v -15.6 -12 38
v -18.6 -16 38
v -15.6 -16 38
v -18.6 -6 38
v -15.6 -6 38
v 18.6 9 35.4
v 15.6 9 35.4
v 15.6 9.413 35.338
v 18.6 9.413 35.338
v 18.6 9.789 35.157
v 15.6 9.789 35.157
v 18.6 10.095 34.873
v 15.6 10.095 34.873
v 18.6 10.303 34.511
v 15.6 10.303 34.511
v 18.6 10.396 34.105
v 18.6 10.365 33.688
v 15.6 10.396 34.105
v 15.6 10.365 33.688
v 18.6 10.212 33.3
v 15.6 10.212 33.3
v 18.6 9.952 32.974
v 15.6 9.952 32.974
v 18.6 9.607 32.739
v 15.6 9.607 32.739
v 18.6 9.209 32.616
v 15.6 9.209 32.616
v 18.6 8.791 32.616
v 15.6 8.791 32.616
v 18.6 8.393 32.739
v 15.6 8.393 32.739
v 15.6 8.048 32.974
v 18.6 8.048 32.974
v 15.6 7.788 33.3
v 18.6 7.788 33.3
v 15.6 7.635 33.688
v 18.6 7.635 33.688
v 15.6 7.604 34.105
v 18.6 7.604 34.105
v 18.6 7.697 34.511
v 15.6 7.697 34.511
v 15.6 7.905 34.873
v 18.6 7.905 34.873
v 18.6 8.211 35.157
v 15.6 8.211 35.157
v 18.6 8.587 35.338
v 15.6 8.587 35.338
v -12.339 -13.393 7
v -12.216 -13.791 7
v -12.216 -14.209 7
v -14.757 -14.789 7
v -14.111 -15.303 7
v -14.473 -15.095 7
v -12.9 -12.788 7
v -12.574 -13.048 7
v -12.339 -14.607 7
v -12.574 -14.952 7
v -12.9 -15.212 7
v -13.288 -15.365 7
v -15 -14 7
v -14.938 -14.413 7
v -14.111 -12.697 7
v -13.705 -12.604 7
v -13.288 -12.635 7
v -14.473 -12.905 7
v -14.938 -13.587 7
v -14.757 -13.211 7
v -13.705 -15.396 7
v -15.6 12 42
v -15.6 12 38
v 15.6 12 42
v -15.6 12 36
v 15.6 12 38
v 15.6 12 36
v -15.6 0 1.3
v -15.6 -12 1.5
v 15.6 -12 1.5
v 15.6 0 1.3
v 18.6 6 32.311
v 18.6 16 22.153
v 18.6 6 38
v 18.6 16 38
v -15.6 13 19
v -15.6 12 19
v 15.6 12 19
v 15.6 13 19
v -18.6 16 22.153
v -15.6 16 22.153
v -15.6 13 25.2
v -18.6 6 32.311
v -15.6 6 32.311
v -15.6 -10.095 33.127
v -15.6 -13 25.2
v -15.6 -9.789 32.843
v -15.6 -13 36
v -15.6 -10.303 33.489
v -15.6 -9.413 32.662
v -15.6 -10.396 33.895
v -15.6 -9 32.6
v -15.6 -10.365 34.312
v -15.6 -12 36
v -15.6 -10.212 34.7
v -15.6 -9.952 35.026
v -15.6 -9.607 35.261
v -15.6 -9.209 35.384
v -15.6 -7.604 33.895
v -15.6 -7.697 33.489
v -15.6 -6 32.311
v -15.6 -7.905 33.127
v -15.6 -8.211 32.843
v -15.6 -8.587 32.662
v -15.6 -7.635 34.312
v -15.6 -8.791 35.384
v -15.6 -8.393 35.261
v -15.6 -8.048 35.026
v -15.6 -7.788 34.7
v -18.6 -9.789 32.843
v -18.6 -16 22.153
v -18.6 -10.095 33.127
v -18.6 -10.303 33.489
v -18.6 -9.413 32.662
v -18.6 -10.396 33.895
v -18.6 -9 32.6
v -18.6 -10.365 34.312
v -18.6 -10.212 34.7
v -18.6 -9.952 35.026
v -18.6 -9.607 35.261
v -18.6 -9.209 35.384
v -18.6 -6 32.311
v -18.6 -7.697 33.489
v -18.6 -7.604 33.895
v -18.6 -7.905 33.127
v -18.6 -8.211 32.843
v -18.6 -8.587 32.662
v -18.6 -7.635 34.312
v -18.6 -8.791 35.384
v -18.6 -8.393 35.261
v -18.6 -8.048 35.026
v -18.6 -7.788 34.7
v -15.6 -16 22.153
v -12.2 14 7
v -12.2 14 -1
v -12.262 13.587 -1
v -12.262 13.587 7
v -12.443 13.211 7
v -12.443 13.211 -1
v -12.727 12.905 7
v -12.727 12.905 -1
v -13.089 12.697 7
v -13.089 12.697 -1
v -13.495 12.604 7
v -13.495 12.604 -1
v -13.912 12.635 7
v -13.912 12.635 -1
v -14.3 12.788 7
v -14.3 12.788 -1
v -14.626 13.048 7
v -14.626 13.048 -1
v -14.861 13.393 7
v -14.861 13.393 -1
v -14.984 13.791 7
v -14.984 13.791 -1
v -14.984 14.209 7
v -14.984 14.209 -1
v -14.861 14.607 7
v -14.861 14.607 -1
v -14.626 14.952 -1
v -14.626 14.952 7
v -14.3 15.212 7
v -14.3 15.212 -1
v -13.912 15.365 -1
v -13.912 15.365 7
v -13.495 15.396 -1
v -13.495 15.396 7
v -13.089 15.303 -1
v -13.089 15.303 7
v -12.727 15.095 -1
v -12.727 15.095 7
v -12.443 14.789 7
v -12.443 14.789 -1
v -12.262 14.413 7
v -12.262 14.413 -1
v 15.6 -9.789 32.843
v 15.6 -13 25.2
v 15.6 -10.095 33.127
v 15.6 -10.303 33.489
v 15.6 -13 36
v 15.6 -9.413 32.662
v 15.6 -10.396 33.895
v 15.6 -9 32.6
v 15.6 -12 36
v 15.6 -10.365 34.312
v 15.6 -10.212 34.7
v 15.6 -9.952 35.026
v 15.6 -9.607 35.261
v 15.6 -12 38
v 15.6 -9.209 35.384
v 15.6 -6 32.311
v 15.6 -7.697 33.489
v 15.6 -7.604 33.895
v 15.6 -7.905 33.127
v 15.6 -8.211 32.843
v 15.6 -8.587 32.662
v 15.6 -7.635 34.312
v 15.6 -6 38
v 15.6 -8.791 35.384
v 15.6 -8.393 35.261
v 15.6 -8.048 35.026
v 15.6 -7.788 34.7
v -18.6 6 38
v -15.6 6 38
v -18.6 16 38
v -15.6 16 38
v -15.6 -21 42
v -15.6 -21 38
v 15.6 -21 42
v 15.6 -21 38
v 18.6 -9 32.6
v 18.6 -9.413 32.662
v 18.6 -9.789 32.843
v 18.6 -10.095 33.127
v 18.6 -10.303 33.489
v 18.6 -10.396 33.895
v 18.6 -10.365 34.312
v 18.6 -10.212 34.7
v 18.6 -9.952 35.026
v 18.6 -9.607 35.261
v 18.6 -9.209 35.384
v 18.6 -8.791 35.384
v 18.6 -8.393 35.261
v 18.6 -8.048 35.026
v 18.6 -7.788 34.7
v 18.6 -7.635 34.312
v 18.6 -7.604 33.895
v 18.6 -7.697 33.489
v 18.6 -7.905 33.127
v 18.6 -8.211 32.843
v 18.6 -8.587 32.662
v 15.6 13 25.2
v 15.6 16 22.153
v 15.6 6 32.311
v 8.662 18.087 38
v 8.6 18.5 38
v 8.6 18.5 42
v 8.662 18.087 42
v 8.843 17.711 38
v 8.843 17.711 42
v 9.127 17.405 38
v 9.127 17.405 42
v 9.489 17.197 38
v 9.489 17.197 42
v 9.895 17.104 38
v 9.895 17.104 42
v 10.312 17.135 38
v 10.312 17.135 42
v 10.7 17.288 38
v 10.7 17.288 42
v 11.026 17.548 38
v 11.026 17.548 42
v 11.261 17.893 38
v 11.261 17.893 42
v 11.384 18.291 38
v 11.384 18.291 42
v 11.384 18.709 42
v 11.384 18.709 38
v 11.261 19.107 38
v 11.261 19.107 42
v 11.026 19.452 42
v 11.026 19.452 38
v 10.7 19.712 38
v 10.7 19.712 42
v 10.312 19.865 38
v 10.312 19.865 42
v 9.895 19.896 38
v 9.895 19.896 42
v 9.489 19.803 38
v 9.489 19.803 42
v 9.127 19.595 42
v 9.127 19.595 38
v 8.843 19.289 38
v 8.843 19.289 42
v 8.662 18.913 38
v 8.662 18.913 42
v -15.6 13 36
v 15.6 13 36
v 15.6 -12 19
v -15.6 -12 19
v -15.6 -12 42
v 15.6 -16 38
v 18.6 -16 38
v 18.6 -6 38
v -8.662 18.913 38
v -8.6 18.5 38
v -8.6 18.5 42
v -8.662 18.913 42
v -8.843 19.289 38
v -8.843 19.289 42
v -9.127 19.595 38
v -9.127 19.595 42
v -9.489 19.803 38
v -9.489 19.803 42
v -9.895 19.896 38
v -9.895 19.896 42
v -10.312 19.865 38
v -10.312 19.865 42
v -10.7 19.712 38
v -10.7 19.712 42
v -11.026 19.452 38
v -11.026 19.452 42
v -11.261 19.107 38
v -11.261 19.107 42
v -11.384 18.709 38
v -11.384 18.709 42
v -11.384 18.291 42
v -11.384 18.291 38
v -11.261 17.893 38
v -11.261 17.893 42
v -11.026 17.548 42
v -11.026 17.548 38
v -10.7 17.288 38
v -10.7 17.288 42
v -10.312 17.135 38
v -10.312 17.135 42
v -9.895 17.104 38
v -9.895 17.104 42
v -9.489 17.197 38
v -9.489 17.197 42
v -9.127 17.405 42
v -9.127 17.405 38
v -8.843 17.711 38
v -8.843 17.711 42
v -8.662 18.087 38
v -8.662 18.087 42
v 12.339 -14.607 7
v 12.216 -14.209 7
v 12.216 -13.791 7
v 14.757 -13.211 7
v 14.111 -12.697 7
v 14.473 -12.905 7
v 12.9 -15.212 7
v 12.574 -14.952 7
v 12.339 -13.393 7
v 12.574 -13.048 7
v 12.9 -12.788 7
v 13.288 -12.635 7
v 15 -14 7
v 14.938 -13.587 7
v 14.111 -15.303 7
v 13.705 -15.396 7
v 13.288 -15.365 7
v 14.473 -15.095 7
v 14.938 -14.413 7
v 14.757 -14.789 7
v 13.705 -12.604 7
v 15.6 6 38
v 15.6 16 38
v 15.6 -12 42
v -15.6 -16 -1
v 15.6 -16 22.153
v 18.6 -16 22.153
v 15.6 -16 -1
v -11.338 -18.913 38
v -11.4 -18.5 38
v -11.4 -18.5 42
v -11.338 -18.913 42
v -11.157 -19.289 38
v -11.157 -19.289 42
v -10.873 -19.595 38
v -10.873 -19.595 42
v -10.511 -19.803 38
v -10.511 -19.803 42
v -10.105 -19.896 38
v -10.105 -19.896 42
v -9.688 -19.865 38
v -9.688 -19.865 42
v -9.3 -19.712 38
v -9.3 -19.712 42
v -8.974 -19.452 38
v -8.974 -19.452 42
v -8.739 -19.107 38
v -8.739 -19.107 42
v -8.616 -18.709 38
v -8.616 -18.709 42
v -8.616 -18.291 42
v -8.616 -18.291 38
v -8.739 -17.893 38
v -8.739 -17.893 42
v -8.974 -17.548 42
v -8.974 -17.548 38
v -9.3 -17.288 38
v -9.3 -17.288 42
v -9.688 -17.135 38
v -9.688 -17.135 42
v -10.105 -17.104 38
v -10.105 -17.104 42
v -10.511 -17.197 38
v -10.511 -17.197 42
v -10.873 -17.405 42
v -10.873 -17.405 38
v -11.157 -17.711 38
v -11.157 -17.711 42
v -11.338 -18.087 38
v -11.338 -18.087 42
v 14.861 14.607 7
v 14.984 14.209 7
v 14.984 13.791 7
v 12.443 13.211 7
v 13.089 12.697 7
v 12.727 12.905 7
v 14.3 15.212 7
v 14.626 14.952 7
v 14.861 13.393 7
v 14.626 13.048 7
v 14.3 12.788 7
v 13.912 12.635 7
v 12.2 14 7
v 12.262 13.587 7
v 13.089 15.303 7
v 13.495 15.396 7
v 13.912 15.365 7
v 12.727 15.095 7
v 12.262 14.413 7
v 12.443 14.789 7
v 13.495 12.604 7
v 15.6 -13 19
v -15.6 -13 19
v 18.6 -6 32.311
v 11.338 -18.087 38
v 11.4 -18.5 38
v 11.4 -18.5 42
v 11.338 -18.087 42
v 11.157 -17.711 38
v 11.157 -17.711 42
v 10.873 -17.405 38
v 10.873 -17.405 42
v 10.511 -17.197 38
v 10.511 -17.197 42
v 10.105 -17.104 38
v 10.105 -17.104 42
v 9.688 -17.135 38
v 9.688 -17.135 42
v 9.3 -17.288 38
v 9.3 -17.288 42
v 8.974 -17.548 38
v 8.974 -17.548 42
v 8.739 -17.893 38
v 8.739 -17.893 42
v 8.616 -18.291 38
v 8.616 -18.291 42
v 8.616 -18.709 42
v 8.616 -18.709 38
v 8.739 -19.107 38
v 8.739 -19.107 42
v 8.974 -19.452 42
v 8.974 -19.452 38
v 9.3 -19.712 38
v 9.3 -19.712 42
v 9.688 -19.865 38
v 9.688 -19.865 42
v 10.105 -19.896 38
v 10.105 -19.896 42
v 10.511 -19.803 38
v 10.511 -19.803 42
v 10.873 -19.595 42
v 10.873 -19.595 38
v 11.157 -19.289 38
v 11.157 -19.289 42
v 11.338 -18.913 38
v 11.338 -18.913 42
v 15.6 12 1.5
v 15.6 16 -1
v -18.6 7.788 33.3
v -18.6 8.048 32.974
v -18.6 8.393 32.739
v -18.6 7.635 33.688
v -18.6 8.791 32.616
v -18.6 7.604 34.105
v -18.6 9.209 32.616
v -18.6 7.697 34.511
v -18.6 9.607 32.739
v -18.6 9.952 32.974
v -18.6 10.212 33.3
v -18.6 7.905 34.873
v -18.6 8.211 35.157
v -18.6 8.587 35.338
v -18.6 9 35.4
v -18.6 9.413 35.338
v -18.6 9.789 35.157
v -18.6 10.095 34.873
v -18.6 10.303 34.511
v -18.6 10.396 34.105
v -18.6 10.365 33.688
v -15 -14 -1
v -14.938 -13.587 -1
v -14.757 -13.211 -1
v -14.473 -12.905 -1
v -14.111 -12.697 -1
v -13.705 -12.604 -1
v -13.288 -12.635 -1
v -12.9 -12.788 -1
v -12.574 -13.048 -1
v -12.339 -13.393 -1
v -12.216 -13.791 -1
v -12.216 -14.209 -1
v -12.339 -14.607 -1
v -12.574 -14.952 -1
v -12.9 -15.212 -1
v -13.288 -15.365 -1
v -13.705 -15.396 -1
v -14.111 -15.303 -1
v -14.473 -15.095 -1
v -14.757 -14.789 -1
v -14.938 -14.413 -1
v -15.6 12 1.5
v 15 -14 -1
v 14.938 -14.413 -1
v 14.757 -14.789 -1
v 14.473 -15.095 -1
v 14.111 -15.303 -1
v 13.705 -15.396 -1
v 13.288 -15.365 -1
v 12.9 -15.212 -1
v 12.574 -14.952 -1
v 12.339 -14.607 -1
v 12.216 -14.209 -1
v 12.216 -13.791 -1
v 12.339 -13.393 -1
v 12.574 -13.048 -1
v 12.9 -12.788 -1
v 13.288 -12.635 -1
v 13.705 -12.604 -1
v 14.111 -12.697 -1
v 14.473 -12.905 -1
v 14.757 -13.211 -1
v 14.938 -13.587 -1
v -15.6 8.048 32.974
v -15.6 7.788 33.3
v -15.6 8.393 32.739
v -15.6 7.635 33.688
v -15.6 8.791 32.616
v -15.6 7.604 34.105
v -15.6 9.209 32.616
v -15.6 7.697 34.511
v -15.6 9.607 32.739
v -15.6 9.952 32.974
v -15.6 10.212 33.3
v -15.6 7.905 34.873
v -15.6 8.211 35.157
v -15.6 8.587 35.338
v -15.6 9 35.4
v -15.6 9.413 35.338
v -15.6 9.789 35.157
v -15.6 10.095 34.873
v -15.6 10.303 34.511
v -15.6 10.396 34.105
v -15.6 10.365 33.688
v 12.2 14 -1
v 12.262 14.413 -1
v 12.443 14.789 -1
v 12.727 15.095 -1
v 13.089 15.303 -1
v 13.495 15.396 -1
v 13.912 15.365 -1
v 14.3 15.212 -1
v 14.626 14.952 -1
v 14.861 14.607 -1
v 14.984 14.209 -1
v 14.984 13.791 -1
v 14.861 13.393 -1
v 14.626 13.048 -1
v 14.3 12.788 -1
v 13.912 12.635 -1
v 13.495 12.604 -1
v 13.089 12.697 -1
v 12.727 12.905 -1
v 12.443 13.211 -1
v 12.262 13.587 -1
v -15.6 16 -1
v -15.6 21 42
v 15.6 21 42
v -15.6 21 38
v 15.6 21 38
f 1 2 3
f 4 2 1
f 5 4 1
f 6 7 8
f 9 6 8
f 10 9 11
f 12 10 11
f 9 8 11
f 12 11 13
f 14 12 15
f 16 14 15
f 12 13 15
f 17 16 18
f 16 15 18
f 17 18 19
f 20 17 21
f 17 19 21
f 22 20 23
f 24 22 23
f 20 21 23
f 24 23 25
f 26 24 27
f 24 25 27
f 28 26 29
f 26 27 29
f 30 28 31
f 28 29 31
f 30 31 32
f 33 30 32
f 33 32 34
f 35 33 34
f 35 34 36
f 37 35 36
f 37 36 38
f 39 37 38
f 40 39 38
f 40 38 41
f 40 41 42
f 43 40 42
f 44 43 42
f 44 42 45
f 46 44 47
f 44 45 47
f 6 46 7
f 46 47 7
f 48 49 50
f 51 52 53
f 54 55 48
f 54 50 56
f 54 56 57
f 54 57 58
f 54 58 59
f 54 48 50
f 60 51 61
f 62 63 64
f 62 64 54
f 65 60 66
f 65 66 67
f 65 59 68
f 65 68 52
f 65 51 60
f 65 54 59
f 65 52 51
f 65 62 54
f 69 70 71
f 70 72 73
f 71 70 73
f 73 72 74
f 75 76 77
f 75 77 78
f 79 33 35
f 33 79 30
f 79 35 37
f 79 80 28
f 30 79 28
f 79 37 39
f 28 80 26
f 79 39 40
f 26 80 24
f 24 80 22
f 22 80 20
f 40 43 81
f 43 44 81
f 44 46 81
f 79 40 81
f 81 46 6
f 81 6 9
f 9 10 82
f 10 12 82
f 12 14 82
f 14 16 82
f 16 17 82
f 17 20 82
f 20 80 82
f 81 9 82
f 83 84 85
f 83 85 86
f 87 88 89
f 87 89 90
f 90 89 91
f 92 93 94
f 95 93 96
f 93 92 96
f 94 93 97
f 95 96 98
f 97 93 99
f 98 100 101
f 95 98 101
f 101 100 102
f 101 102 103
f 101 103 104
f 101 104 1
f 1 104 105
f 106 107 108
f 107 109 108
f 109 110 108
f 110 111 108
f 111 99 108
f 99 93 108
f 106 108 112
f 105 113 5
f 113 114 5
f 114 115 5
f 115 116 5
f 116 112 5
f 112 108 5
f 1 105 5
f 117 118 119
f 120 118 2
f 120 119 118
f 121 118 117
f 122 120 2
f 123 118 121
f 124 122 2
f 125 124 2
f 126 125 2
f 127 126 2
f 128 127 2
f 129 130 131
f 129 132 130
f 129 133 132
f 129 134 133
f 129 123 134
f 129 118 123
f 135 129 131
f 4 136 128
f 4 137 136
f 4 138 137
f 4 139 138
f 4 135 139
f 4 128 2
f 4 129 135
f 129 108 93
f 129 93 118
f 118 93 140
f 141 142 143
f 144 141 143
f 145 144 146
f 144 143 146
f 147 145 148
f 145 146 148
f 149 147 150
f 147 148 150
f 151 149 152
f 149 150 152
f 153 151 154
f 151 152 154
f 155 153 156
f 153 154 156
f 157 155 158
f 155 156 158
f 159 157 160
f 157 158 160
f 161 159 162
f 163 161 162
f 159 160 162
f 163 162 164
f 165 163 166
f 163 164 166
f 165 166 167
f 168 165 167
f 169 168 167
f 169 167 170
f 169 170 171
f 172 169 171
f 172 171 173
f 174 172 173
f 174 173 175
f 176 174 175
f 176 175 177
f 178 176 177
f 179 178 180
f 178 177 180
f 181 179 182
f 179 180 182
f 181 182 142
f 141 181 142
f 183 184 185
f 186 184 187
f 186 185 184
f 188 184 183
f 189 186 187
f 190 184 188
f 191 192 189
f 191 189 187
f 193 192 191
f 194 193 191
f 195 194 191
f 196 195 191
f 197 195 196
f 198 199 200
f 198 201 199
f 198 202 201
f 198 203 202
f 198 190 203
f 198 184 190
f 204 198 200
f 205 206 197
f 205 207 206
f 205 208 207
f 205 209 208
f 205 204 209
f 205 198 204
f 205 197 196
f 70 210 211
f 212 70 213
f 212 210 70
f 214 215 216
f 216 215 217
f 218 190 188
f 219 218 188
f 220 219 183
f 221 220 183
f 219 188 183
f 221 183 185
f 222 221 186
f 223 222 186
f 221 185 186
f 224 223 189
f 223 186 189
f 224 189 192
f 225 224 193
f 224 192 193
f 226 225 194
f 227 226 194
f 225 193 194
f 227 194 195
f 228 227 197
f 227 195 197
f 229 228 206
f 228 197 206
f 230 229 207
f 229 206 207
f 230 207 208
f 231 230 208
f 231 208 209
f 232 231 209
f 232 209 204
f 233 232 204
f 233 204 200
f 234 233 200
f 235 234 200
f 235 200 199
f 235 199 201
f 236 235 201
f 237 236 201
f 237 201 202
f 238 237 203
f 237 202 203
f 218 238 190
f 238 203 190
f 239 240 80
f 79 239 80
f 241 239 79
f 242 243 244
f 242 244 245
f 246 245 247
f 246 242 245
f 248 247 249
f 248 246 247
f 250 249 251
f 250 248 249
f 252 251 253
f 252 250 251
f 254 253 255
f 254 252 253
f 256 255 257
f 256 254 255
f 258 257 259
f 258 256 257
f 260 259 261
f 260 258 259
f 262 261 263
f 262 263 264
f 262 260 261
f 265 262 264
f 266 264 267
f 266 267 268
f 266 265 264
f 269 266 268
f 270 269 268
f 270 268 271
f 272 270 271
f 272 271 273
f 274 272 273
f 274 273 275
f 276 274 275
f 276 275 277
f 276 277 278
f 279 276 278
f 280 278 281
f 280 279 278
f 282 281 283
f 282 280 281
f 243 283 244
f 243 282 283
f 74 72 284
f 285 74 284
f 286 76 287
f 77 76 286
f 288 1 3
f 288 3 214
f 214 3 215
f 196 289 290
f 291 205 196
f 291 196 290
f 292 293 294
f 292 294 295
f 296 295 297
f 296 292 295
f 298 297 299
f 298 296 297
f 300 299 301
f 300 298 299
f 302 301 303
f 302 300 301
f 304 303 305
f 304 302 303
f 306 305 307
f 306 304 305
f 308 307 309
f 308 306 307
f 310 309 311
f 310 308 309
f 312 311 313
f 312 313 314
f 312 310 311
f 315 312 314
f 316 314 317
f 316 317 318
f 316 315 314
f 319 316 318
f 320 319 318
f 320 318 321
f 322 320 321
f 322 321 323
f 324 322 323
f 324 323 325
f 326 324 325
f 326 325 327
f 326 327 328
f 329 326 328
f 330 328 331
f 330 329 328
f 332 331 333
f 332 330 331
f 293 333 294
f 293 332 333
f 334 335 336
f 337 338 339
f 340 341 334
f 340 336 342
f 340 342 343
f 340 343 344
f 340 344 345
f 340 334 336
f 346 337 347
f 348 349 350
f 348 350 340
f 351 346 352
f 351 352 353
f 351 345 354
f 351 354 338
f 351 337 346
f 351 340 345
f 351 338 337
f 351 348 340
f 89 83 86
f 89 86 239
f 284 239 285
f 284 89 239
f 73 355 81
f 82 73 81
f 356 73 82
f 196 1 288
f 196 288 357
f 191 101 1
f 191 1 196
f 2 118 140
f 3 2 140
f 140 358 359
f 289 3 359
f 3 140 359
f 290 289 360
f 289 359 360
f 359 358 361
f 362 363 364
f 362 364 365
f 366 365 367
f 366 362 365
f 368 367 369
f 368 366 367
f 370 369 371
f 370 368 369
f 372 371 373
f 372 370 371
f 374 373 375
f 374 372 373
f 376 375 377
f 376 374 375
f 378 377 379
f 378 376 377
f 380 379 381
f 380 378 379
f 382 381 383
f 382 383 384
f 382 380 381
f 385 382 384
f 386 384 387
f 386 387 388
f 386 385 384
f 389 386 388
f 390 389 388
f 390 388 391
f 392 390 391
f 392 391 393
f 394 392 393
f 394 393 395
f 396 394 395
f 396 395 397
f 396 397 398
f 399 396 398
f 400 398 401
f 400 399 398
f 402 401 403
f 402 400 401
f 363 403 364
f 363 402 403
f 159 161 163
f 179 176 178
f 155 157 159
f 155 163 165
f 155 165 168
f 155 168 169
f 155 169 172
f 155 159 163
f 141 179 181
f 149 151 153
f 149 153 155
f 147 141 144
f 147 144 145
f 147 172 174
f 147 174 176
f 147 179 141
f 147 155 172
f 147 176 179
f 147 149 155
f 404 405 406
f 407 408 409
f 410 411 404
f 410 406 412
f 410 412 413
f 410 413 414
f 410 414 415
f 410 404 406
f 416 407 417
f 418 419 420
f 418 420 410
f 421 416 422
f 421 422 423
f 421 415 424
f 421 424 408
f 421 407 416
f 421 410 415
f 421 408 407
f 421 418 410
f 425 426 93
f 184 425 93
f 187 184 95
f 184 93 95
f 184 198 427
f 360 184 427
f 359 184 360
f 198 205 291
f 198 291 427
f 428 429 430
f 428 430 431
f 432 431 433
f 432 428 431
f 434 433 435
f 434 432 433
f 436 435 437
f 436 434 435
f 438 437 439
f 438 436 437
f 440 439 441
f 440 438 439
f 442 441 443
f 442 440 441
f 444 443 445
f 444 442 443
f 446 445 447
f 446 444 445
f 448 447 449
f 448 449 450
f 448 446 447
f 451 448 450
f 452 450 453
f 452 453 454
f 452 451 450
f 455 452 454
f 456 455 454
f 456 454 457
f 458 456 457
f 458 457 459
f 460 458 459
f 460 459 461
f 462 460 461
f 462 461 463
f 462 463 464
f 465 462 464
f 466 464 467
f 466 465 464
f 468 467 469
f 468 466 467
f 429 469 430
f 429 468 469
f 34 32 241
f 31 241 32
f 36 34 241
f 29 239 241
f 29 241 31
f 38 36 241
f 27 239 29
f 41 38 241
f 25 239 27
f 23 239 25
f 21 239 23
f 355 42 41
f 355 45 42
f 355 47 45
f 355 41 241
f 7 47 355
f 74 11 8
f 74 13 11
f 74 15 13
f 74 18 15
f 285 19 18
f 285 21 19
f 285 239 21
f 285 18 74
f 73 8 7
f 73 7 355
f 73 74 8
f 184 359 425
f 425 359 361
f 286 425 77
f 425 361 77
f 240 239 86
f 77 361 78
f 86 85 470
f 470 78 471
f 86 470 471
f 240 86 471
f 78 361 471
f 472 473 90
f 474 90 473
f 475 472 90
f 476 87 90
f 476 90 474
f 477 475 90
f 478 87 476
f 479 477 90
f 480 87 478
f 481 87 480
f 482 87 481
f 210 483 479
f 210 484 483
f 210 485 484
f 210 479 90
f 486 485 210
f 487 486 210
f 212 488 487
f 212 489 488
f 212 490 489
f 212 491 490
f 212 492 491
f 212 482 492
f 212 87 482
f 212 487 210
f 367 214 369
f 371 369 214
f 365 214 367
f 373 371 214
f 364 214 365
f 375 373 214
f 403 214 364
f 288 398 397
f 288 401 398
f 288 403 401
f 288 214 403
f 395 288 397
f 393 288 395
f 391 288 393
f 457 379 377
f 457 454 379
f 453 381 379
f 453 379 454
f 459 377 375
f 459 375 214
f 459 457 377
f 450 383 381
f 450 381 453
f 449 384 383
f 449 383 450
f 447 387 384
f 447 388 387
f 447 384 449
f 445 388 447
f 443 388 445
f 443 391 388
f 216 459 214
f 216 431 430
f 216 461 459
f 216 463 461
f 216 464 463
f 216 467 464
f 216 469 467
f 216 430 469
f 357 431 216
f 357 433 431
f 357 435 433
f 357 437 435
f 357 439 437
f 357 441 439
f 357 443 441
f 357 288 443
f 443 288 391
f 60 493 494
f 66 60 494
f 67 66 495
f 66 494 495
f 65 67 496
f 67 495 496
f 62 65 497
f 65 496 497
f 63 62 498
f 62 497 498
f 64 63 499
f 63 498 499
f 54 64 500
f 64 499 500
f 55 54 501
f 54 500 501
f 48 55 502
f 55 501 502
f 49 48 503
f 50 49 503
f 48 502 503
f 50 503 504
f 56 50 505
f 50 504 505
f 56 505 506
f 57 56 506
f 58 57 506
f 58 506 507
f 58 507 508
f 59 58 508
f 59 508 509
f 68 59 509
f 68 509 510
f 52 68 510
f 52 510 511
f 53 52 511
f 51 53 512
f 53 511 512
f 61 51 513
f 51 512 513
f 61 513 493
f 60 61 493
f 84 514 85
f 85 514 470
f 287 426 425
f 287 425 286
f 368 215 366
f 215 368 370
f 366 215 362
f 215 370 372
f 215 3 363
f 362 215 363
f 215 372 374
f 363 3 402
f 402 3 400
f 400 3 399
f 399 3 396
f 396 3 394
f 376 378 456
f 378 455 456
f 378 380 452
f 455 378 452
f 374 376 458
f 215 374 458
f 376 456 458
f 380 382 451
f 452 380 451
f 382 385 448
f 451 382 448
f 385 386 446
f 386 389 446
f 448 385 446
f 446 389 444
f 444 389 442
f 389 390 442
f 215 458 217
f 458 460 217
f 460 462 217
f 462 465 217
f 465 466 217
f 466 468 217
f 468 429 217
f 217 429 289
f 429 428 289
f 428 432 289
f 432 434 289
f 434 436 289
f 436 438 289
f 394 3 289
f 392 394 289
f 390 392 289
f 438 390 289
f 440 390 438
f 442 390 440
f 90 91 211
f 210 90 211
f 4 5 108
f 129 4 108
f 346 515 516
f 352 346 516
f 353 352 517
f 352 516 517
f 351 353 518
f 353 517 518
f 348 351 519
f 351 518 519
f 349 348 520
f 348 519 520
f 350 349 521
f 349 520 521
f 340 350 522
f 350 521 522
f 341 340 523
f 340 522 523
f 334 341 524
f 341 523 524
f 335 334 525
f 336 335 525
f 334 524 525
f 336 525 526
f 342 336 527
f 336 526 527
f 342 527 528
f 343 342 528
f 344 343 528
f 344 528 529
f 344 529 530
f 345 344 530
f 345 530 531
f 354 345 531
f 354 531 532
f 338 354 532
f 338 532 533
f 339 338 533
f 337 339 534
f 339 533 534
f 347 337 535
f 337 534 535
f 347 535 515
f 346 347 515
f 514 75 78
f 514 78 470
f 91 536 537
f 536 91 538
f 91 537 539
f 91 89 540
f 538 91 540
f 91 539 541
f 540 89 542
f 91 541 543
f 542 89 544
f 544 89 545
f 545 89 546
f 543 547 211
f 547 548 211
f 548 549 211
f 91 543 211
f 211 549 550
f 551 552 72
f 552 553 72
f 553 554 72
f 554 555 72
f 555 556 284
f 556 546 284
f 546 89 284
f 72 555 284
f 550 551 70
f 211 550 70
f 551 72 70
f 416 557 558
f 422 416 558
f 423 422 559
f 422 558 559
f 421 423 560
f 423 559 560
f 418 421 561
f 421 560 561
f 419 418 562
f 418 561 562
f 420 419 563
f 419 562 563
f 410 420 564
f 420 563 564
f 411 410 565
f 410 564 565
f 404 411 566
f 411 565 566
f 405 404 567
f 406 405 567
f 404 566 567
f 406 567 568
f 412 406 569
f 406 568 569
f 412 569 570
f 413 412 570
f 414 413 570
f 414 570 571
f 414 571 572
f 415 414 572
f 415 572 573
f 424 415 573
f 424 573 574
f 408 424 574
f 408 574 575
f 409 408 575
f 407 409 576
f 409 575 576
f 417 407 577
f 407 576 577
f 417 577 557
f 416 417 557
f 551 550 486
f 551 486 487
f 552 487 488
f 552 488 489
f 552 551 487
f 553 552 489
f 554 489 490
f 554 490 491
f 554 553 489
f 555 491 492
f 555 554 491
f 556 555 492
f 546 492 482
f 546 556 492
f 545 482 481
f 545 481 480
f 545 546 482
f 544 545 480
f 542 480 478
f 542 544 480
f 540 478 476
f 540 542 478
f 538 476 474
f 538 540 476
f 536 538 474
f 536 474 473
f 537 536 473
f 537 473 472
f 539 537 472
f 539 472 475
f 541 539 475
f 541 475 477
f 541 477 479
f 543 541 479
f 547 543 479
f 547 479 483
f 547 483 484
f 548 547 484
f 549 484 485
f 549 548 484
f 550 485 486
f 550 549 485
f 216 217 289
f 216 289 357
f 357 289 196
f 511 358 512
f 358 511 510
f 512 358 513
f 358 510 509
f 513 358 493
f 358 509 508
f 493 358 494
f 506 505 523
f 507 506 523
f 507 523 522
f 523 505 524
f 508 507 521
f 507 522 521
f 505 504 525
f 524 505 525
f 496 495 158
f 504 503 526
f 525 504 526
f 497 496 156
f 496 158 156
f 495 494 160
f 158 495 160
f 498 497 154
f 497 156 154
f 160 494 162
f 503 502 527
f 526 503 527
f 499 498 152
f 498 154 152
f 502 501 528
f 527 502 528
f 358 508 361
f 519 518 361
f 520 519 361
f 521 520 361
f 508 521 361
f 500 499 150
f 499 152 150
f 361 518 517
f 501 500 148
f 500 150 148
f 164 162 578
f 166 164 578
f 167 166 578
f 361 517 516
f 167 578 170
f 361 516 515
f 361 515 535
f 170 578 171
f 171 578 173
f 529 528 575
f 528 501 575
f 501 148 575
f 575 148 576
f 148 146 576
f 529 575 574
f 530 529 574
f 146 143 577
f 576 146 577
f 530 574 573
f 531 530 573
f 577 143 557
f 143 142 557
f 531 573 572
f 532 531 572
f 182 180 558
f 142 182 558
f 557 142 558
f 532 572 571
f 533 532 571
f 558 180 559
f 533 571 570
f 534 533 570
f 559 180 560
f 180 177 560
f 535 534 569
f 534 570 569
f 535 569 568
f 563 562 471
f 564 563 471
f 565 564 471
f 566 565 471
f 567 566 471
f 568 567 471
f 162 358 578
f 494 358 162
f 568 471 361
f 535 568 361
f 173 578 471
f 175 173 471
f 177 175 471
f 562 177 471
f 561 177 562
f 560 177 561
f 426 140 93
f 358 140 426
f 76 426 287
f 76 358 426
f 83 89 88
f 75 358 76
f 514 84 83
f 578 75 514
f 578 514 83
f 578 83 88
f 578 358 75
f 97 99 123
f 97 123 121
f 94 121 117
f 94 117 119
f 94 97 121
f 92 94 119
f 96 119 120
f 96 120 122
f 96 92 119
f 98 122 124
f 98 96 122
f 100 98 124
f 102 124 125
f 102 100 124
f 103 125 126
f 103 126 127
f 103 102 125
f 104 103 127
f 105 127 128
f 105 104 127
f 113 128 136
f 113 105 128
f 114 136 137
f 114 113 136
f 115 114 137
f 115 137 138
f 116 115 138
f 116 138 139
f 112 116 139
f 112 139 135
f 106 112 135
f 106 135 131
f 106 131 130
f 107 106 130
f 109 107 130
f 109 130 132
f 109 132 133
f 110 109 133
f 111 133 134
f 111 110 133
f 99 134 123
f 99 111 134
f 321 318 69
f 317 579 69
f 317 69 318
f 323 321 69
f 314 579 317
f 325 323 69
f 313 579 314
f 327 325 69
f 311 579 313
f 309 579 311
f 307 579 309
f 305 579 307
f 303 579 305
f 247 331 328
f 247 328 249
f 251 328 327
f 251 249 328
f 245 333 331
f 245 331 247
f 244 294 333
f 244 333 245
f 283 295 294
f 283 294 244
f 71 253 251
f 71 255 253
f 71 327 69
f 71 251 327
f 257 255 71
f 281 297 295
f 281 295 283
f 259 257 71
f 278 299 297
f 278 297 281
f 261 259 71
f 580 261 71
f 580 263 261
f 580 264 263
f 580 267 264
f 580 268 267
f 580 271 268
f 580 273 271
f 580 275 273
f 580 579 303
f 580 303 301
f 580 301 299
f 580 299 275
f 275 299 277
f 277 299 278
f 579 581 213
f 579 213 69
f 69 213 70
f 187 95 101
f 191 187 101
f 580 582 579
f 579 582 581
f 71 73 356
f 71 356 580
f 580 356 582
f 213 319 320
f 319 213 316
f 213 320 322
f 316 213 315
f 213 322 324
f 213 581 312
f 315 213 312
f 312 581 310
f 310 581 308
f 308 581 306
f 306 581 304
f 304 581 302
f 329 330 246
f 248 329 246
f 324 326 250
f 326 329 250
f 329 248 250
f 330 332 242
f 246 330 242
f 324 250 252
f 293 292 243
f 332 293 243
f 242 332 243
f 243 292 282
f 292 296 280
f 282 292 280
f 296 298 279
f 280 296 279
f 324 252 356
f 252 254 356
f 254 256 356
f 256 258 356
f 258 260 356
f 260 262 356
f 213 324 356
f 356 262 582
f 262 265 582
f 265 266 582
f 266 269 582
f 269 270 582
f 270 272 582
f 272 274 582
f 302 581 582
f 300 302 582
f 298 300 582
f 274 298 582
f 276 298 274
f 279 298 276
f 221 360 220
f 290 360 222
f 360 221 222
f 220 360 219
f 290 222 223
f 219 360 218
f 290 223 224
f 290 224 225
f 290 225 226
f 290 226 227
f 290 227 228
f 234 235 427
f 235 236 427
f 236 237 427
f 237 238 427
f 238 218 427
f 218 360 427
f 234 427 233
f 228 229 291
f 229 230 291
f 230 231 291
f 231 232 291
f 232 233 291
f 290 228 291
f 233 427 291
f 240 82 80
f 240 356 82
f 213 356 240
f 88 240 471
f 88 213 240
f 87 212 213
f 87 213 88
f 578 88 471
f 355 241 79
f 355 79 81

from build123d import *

# Parameters (mm, degrees)
EXTRUDE_1_DEPTH      = 2
EXTRUDE_1_DEPTH_BACK = 1
SKETCH_1_W           = 31.2
SKETCH_1_H           = 24
EXTRUDE_2_DEPTH      = 36
EXTRUDE_2_DEPTH_BACK = 3
SKETCH_2_W           = 31.2
SKETCH_2_H           = 4
SKETCH_3_R           = 1.4
EXTRUDE_3_DEPTH      = 3
SKETCH_4_R           = 1.4
CUT_EXTRUDE_1_DEPTH  = 8
SKETCH_5_W           = 17
SKETCH_5_H           = 1
CUT_EXTRUDE_2_DEPTH  = 31.2
CUT_EXTRUDE_3_DEPTH  = 31.2
SKETCH_7_R           = 1.4
EXTRUDE_4_DEPTH      = 4


with BuildPart() as part:
    # 草图1 → 凸台-拉伸1 (new, two sides: drawn at the far end of the back side and taken through both)
    with BuildSketch(Plane.XY.offset(-EXTRUDE_1_DEPTH_BACK)):
        Rectangle(SKETCH_1_W, SKETCH_1_H)
    extrude(amount=EXTRUDE_1_DEPTH + EXTRUDE_1_DEPTH_BACK)

    # 草图2 → 凸台-拉伸2 (add, two sides: drawn at the far end of the back side and taken through both)
    with BuildSketch(Plane.XY.offset(2).offset(-EXTRUDE_2_DEPTH_BACK)):
        with Locations((0, 14)):
            Rectangle(SKETCH_2_W, SKETCH_2_H)
        with Locations((0, -14)):
            Rectangle(SKETCH_2_W, SKETCH_2_H)
    extrude(amount=EXTRUDE_2_DEPTH + EXTRUDE_2_DEPTH_BACK)

    # 草图3 → 凸台-拉伸3 (add)
    # profile 1 of 2: a face of its own
    with BuildSketch(Plane.ZY.offset(15.6)):
        Polygon((38, 16), (31, 16), (22.152932489, 16), (32.310715372, 6), (38, 6), align=None)
        with Locations((34, 9)):
            Circle(SKETCH_3_R, mode=Mode.SUBTRACT)
    # profile 2 of 2: a face of its own
    with BuildSketch(Plane.ZY.offset(15.6)):
        Polygon((38, -16), (38, -6), (32.310715372, -6), (22.152932489, -16), (31, -16), align=None)
        with Locations(Location((34, -9, 0), (0, 0, 180))):
            Circle(SKETCH_3_R, mode=Mode.SUBTRACT)
    extrude_3 = extrude(amount=EXTRUDE_3_DEPTH)

    # 草图4 → 切除-拉伸1 (cut)
    with BuildSketch(Plane(origin=(0, 0, -1), x_dir=(-1, 0, 0), z_dir=(0, 0, -1))):
        with Locations((13.6, -14)):
            Circle(SKETCH_4_R)
        with Locations(Location((13.6, 14, 0), (0, 0, 180))):
            Circle(SKETCH_4_R)
        with Locations(Location((-13.6, -14, 0), (0, 0, 180))):
            Circle(SKETCH_4_R)
        with Locations((-13.6, 14)):
            Circle(SKETCH_4_R)
    extrude(amount=-CUT_EXTRUDE_1_DEPTH, mode=Mode.SUBTRACT)

    # 镜向1: 凸台-拉伸3 across plane
    add(extrude_3.mirror(Plane(origin=(0, 0, 0), x_dir=(0, 0, 1), z_dir=(1, 0, 0))))

    # 草图5 → 切除-拉伸2 (cut)
    with BuildSketch(Plane.ZY.offset(15.6)):
        with Locations((27.5, 12.5)):
            Rectangle(SKETCH_5_W, SKETCH_5_H)
        with Locations((27.5, -12.5)):
            Rectangle(SKETCH_5_W, SKETCH_5_H)
    extrude(amount=-CUT_EXTRUDE_2_DEPTH, mode=Mode.SUBTRACT)

    # 草图6 → 切除-拉伸3 (cut)
    with BuildSketch(Plane.ZY.offset(15.6)):
        Polygon((1.3, 0), (1.5, 12), (2, 12), (2, -12), (1.5, -12), align=None)
    extrude(amount=-CUT_EXTRUDE_3_DEPTH, mode=Mode.SUBTRACT)

    # 草图7 → 凸台-拉伸4 (add)
    # profile 1 of 2: a face of its own
    with BuildSketch(Plane.XY.offset(38)):
        Polygon((-15.6, 12), (15.6, 12), (15.6, 16), (15.6, 21), (-15.6, 21), (-15.6, 16), align=None)
        with Locations((-10, 18.5)):
            Circle(SKETCH_7_R, mode=Mode.SUBTRACT)
        with Locations(Location((10, 18.5, 0), (0, 0, 180))):
            Circle(SKETCH_7_R, mode=Mode.SUBTRACT)
    # profile 2 of 2: a face of its own
    with BuildSketch(Plane.XY.offset(38)):
        Polygon((-15.6, -16), (-15.6, -21), (15.6, -21), (15.6, -16), (15.6, -12), (-15.6, -12), align=None)
        with Locations((10, -18.5)):
            Circle(SKETCH_7_R, mode=Mode.SUBTRACT)
        with Locations(Location((-10, -18.5, 0), (0, 0, 180))):
            Circle(SKETCH_7_R, mode=Mode.SUBTRACT)
    extrude(amount=EXTRUDE_4_DEPTH)


solid = part.part
